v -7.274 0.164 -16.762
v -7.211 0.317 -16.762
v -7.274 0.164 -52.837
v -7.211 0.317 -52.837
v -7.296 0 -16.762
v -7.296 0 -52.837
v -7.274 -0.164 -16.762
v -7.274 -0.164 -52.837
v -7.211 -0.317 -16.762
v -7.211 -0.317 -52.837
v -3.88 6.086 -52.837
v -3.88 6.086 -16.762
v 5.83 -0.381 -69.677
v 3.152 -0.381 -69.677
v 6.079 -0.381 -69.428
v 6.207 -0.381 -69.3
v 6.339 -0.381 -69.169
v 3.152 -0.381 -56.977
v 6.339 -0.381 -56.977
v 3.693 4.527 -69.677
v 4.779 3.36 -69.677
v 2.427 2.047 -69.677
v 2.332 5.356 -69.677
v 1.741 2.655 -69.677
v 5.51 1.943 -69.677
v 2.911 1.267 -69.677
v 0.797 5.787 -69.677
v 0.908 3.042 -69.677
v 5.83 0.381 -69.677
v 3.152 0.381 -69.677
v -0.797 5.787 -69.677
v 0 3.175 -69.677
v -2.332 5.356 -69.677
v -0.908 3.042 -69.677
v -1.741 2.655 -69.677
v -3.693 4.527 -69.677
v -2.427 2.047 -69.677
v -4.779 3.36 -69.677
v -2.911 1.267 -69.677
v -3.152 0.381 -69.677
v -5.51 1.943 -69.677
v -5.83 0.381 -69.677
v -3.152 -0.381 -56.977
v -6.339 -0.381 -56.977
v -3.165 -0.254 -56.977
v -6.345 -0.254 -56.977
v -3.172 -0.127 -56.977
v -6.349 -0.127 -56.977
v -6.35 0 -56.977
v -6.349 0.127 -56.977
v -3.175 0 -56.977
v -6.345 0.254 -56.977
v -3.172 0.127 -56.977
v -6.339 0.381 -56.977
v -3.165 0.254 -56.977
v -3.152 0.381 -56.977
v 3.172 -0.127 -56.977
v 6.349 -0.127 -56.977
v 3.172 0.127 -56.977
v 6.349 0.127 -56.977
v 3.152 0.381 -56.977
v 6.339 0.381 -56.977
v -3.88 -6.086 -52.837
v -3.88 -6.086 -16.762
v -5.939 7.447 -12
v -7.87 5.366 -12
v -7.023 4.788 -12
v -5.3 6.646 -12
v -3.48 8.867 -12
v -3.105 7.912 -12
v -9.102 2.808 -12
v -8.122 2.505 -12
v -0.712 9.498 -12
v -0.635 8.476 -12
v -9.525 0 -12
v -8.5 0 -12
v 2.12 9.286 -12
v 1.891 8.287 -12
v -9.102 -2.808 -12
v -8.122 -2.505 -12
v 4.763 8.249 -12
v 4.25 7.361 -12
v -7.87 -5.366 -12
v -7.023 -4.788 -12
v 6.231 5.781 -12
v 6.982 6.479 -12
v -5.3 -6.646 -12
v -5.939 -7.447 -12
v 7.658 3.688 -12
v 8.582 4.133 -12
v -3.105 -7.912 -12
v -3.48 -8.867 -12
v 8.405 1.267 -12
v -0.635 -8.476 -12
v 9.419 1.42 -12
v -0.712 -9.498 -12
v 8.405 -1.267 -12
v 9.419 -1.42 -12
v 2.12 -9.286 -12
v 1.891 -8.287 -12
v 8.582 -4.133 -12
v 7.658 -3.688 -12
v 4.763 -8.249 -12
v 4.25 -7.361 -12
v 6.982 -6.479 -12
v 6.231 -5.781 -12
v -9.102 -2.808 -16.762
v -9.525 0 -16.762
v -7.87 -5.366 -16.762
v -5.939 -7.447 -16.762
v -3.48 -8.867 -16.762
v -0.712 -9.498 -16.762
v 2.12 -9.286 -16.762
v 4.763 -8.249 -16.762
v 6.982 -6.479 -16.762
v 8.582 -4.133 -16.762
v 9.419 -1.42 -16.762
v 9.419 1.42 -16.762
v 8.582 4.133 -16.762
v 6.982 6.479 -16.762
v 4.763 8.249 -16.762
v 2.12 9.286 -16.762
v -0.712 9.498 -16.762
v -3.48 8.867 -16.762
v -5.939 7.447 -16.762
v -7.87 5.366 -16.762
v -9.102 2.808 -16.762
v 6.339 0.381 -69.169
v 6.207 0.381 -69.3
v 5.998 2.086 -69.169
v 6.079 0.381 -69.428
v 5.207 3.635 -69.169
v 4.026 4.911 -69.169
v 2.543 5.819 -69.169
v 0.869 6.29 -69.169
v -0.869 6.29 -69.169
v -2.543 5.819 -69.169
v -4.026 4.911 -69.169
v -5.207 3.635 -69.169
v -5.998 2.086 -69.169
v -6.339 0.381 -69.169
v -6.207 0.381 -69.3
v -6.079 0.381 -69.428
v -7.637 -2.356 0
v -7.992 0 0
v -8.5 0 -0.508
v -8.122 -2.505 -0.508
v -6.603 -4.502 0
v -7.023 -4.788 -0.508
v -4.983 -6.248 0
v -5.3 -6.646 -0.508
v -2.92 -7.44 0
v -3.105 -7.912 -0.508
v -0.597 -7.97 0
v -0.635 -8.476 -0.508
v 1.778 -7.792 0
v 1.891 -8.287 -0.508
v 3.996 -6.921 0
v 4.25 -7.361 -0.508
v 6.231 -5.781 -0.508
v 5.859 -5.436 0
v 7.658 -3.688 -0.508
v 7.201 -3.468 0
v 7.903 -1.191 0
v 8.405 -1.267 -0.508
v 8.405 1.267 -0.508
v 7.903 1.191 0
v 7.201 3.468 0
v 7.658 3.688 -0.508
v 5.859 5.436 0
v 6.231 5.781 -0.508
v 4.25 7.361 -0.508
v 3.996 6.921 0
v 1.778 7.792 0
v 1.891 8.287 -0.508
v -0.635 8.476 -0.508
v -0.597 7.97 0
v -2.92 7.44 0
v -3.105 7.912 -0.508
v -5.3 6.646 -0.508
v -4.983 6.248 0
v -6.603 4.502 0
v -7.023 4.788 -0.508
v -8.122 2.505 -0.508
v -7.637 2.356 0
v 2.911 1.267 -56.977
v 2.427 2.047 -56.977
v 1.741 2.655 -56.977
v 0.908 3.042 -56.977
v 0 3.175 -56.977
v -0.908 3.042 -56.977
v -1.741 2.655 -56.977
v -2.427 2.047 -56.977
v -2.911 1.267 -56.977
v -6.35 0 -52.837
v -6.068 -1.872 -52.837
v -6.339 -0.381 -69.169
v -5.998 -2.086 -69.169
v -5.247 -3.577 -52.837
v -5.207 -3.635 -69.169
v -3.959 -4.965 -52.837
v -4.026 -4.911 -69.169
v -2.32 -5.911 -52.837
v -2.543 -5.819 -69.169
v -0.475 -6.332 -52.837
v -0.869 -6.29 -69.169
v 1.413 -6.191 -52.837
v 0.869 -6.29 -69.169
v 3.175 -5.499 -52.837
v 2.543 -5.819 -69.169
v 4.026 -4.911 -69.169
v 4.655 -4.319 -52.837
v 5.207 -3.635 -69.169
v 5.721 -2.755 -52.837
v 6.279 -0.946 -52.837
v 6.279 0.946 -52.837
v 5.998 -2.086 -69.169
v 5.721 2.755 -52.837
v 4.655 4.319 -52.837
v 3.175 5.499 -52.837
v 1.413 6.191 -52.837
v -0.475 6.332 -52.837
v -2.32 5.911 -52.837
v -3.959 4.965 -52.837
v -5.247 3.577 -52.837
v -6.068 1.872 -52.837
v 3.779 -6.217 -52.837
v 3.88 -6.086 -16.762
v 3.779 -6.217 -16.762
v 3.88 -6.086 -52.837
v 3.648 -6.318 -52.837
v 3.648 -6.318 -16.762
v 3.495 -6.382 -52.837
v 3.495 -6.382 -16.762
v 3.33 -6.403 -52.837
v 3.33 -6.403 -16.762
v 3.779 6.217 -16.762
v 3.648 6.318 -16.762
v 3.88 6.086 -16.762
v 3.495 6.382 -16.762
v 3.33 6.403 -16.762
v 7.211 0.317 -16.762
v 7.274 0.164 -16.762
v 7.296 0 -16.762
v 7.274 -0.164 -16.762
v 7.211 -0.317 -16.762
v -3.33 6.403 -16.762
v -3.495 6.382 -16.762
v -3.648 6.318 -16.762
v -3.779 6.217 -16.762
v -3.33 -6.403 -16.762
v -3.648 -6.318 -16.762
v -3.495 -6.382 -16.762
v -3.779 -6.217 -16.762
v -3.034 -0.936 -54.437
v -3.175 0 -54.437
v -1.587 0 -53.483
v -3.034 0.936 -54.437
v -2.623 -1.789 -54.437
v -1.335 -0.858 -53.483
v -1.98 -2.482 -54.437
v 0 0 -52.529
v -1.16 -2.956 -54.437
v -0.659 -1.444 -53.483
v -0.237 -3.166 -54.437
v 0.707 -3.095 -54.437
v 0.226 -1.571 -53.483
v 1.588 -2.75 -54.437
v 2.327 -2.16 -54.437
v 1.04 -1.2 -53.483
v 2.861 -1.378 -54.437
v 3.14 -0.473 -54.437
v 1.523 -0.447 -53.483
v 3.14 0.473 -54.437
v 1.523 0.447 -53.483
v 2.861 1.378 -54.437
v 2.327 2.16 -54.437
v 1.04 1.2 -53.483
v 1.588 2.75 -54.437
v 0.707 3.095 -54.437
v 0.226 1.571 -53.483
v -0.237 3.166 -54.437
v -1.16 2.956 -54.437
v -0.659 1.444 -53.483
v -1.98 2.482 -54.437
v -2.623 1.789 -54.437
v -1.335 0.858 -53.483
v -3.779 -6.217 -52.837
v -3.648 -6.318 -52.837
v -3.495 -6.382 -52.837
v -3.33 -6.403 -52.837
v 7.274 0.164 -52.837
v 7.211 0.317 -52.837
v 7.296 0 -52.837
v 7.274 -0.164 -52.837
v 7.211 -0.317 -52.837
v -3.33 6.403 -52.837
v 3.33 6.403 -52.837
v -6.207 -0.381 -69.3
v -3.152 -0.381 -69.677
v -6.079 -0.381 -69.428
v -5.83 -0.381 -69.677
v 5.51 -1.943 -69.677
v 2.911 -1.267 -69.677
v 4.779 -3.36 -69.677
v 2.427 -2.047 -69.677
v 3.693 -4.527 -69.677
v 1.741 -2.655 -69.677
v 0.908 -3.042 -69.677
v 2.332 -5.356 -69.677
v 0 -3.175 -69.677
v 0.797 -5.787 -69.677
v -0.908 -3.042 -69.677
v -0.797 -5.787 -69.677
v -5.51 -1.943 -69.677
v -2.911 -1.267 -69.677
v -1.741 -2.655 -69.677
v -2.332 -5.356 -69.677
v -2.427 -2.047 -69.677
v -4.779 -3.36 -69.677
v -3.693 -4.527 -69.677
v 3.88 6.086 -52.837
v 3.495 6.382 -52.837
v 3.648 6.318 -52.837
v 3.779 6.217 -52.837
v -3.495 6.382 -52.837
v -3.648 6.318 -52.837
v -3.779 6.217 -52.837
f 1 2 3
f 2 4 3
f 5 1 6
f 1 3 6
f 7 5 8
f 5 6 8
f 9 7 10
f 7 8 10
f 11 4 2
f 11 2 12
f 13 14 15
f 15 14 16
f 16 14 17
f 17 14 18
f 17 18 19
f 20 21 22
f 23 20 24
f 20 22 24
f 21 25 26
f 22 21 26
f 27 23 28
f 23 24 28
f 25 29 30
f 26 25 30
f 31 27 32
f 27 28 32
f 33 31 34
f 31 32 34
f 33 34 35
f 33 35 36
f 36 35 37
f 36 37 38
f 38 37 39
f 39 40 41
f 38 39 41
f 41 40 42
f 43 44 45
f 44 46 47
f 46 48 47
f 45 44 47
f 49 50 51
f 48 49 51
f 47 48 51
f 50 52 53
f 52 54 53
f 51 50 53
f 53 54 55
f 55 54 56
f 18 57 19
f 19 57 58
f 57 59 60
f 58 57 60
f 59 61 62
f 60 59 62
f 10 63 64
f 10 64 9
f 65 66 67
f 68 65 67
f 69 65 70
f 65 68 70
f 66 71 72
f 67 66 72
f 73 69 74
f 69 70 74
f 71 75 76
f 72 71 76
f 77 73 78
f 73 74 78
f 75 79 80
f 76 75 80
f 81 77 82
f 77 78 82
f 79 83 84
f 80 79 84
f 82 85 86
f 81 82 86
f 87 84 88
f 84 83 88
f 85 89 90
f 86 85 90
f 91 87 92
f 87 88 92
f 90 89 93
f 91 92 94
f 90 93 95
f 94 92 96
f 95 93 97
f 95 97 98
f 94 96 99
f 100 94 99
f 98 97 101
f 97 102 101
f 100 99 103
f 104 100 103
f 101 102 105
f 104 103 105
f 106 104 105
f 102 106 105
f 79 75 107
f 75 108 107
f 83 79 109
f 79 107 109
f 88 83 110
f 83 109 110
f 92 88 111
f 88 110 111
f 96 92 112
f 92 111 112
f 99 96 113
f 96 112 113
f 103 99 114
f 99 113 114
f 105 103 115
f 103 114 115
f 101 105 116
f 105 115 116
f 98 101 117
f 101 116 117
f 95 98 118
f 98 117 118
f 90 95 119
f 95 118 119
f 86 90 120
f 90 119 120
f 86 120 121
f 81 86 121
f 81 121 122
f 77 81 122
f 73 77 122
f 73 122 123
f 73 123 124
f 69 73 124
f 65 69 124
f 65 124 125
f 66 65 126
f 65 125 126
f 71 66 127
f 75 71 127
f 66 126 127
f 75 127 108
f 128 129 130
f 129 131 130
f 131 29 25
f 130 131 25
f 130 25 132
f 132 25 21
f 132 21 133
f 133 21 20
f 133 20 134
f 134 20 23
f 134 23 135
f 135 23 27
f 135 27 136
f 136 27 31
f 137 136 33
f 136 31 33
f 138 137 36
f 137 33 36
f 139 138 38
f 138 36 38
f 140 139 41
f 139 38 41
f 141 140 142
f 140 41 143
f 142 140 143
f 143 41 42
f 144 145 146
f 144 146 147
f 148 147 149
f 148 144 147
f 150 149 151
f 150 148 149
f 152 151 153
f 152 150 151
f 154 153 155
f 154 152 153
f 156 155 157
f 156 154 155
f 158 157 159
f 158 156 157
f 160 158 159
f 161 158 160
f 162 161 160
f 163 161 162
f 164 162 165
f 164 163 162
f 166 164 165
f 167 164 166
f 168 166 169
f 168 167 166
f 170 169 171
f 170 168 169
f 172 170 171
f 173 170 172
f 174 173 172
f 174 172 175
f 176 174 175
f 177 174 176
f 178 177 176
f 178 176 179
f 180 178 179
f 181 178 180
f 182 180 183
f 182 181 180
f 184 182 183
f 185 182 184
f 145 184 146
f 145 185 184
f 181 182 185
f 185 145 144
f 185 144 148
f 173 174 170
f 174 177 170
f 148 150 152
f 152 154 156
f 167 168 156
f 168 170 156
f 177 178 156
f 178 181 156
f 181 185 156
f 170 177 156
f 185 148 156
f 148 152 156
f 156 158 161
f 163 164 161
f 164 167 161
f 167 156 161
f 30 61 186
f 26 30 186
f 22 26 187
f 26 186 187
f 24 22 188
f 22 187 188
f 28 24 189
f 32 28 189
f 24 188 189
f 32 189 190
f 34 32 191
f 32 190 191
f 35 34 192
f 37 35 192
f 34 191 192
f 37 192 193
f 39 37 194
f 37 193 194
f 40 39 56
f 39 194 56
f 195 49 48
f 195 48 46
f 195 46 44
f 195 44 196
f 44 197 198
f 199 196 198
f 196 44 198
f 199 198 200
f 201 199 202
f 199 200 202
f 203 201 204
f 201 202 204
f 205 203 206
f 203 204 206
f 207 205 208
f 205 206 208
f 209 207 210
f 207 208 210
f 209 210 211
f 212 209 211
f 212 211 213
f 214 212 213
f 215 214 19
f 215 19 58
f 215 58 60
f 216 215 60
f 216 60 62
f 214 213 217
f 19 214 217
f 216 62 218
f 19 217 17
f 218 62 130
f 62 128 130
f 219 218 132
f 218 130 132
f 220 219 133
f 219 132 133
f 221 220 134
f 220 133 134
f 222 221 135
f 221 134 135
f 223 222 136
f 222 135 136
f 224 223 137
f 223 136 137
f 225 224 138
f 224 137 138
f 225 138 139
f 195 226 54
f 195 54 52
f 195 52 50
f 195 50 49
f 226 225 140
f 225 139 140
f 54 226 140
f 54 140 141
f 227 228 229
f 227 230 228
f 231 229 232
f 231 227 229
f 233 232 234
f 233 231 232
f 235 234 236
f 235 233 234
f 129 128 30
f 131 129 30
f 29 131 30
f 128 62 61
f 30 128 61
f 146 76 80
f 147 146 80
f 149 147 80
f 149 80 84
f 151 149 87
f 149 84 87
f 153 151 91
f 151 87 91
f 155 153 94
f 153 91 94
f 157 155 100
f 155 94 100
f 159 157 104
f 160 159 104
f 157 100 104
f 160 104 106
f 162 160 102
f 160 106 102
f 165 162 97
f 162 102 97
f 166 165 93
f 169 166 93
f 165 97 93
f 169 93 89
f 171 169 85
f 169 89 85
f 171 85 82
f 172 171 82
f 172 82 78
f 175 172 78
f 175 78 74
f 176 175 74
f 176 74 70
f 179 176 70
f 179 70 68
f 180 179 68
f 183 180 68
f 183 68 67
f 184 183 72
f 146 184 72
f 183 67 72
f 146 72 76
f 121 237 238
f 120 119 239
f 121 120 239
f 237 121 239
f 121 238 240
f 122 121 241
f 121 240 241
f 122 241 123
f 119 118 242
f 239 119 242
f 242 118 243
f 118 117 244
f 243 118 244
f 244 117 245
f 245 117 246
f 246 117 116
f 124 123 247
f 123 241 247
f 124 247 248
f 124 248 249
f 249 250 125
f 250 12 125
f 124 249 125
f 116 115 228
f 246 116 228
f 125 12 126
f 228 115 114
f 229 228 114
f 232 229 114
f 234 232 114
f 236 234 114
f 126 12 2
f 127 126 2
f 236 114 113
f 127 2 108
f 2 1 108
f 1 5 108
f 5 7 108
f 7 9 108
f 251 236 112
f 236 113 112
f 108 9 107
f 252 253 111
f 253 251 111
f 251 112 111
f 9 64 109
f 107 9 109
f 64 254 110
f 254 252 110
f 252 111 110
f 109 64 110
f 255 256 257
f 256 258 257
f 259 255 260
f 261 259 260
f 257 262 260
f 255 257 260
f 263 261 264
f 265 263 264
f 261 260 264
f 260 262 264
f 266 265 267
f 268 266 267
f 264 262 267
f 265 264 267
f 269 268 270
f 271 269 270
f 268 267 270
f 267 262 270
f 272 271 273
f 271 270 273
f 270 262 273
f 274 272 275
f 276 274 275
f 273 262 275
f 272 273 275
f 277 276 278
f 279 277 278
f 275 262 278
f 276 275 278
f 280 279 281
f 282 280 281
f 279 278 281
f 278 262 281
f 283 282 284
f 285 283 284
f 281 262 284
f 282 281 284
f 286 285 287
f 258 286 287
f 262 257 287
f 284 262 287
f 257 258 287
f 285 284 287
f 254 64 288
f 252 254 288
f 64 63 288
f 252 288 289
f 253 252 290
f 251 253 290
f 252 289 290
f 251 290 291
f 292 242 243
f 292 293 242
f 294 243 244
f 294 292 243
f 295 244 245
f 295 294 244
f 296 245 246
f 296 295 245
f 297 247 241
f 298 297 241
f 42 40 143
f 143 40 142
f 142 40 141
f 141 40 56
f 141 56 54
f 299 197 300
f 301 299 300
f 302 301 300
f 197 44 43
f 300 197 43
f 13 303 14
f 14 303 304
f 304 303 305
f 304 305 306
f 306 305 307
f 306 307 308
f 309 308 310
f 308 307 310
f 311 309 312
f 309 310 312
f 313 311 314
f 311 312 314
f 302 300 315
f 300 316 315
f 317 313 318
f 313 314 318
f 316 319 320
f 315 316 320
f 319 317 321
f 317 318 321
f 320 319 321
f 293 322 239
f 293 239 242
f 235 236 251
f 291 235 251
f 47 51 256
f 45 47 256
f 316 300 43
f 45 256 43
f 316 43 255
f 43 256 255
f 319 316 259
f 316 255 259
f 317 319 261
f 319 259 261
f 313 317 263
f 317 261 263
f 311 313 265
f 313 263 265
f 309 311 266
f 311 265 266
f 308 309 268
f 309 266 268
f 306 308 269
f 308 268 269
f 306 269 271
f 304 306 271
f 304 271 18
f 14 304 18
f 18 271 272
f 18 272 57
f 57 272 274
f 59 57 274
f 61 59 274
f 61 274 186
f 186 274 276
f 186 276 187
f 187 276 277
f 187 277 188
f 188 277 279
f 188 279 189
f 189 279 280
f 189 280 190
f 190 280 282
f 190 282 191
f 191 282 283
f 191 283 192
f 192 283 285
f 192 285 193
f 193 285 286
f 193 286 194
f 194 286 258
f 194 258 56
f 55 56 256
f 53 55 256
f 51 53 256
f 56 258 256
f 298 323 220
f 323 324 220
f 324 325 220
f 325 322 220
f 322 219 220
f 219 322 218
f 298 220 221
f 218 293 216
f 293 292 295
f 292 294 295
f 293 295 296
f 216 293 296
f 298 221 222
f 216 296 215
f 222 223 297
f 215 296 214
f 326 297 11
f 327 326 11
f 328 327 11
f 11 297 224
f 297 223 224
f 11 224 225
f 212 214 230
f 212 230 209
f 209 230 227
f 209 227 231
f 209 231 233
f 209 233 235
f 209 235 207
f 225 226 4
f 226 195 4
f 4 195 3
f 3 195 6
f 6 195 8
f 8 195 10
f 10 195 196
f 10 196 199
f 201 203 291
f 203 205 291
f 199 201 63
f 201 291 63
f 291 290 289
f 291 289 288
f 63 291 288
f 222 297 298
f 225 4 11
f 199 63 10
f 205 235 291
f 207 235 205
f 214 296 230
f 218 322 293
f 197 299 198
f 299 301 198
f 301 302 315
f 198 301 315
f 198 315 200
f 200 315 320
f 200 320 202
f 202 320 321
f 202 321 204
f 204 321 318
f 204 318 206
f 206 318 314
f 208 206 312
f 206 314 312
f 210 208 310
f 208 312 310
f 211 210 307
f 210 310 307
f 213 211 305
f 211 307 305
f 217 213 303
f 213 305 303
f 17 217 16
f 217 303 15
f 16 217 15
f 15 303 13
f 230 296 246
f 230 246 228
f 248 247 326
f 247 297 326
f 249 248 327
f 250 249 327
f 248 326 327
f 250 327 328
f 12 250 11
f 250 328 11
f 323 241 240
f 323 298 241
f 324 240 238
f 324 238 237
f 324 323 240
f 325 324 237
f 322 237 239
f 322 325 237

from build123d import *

# Parameters (mm, degrees)
SKETCH2_OUTSIDE_W  = 35.99
SKETCH2_OUTSIDE_H  = 35.99
CUT_EXTRUDE1_DEPTH = 36.07435
FILLET1_R          = 0.635
CUT_EXTRUDE2_START = -12.7
CUT_EXTRUDE2_DEPTH = 12.7
CHAMFER1_SIZE      = 0.508


with BuildPart() as part:
    # Sketch1 → Revolve1 (revolve)
    with BuildSketch(Plane(origin=(0, 0, 0), x_dir=(0, 0, -1), z_dir=(1, 0, 0)), mode=Mode.PRIVATE) as revolve1_sk:
        Polygon((0, 0), (0, 8.5), (12, 8.5), (12, 9.525), (16.7625, 9.525), (16.7625, 7.62), (40.08605, 7.62), (52.83685, 7.62), (52.83685, 6.35), (69.67705, 6.35), (69.67705, 3.175), (54.43705, 3.175), (52.529317535, 0), align=None)
    revolve(revolve1_sk.sketch.rotate(Axis((0, 0, 0), (0, 0, 1)), 90), axis=Axis((0, 0, 0), (0, 0, 1)))

    # Sketch2 outside → Cut-Extrude1 (cut)
    with BuildSketch(Plane(origin=(0, 0, -16.7625), x_dir=(-1, 0, 0), z_dir=(0, 0, -1))):
        Rectangle(SKETCH2_OUTSIDE_W, SKETCH2_OUTSIDE_H)
        Polygon((3.696970073, 6.40334), (-3.696970073, 6.40334), (-7.393940145, 0), (-3.696970073, -6.40334), (3.696970073, -6.40334), (7.393940145, 0), align=None, mode=Mode.SUBTRACT)
    extrude(amount=CUT_EXTRUDE1_DEPTH, mode=Mode.SUBTRACT)

    # Fillet1
    fillet1_edges = [part.edges().sort_by_distance(p)[0] for p in [
        (-7.393940145, 0, -34.799675),
        (-3.696970073, -6.40334, -34.799675),
        (3.696970073, -6.40334, -34.799675),
        (7.393940145, 0, -34.799675),
        (3.696970073, 6.40334, -34.799675),
        (-3.696970073, 6.40334, -34.799675),
    ]]
    fillet(fillet1_edges, radius=FILLET1_R)

    # Sketch3 → Cut-Extrude2 (cut)
    with BuildSketch(Plane(origin=(0, 0, -69.67705), x_dir=(-1, 0, 0), z_dir=(0, 0, -1)).offset(CUT_EXTRUDE2_START)):
        with BuildLine():
            Line((-8.998734144, 0.381), (-3.152057106, 0.381))
            ThreePointArc((-3.152057106, 0.381), (0, 3.175), (3.152057106, 0.381))
            Line((3.152057106, 0.381), (8.998734144, 0.381))
            Line((8.998734144, 0.381), (8.998734144, -0.381))
            Line((8.998734144, -0.381), (3.152057106, -0.381))
            ThreePointArc((3.152057106, -0.381), (0, -3.175), (-3.152057106, -0.381))
            Line((-3.152057106, -0.381), (-8.998734144, -0.381))
            Line((-8.998734144, -0.381), (-8.998734144, 0.381))
        make_face()
    extrude(amount=CUT_EXTRUDE2_DEPTH, mode=Mode.SUBTRACT)

    # Chamfer1
    chamfer1_edges = [part.edges().sort_by_distance(p)[0] for p in [
        (0, 6.35, -69.67705),
        (8.5, 0, 0),
        (0, -6.35, -69.67705),
    ]]
    chamfer(chamfer1_edges, length=CHAMFER1_SIZE)


solid = part.part
